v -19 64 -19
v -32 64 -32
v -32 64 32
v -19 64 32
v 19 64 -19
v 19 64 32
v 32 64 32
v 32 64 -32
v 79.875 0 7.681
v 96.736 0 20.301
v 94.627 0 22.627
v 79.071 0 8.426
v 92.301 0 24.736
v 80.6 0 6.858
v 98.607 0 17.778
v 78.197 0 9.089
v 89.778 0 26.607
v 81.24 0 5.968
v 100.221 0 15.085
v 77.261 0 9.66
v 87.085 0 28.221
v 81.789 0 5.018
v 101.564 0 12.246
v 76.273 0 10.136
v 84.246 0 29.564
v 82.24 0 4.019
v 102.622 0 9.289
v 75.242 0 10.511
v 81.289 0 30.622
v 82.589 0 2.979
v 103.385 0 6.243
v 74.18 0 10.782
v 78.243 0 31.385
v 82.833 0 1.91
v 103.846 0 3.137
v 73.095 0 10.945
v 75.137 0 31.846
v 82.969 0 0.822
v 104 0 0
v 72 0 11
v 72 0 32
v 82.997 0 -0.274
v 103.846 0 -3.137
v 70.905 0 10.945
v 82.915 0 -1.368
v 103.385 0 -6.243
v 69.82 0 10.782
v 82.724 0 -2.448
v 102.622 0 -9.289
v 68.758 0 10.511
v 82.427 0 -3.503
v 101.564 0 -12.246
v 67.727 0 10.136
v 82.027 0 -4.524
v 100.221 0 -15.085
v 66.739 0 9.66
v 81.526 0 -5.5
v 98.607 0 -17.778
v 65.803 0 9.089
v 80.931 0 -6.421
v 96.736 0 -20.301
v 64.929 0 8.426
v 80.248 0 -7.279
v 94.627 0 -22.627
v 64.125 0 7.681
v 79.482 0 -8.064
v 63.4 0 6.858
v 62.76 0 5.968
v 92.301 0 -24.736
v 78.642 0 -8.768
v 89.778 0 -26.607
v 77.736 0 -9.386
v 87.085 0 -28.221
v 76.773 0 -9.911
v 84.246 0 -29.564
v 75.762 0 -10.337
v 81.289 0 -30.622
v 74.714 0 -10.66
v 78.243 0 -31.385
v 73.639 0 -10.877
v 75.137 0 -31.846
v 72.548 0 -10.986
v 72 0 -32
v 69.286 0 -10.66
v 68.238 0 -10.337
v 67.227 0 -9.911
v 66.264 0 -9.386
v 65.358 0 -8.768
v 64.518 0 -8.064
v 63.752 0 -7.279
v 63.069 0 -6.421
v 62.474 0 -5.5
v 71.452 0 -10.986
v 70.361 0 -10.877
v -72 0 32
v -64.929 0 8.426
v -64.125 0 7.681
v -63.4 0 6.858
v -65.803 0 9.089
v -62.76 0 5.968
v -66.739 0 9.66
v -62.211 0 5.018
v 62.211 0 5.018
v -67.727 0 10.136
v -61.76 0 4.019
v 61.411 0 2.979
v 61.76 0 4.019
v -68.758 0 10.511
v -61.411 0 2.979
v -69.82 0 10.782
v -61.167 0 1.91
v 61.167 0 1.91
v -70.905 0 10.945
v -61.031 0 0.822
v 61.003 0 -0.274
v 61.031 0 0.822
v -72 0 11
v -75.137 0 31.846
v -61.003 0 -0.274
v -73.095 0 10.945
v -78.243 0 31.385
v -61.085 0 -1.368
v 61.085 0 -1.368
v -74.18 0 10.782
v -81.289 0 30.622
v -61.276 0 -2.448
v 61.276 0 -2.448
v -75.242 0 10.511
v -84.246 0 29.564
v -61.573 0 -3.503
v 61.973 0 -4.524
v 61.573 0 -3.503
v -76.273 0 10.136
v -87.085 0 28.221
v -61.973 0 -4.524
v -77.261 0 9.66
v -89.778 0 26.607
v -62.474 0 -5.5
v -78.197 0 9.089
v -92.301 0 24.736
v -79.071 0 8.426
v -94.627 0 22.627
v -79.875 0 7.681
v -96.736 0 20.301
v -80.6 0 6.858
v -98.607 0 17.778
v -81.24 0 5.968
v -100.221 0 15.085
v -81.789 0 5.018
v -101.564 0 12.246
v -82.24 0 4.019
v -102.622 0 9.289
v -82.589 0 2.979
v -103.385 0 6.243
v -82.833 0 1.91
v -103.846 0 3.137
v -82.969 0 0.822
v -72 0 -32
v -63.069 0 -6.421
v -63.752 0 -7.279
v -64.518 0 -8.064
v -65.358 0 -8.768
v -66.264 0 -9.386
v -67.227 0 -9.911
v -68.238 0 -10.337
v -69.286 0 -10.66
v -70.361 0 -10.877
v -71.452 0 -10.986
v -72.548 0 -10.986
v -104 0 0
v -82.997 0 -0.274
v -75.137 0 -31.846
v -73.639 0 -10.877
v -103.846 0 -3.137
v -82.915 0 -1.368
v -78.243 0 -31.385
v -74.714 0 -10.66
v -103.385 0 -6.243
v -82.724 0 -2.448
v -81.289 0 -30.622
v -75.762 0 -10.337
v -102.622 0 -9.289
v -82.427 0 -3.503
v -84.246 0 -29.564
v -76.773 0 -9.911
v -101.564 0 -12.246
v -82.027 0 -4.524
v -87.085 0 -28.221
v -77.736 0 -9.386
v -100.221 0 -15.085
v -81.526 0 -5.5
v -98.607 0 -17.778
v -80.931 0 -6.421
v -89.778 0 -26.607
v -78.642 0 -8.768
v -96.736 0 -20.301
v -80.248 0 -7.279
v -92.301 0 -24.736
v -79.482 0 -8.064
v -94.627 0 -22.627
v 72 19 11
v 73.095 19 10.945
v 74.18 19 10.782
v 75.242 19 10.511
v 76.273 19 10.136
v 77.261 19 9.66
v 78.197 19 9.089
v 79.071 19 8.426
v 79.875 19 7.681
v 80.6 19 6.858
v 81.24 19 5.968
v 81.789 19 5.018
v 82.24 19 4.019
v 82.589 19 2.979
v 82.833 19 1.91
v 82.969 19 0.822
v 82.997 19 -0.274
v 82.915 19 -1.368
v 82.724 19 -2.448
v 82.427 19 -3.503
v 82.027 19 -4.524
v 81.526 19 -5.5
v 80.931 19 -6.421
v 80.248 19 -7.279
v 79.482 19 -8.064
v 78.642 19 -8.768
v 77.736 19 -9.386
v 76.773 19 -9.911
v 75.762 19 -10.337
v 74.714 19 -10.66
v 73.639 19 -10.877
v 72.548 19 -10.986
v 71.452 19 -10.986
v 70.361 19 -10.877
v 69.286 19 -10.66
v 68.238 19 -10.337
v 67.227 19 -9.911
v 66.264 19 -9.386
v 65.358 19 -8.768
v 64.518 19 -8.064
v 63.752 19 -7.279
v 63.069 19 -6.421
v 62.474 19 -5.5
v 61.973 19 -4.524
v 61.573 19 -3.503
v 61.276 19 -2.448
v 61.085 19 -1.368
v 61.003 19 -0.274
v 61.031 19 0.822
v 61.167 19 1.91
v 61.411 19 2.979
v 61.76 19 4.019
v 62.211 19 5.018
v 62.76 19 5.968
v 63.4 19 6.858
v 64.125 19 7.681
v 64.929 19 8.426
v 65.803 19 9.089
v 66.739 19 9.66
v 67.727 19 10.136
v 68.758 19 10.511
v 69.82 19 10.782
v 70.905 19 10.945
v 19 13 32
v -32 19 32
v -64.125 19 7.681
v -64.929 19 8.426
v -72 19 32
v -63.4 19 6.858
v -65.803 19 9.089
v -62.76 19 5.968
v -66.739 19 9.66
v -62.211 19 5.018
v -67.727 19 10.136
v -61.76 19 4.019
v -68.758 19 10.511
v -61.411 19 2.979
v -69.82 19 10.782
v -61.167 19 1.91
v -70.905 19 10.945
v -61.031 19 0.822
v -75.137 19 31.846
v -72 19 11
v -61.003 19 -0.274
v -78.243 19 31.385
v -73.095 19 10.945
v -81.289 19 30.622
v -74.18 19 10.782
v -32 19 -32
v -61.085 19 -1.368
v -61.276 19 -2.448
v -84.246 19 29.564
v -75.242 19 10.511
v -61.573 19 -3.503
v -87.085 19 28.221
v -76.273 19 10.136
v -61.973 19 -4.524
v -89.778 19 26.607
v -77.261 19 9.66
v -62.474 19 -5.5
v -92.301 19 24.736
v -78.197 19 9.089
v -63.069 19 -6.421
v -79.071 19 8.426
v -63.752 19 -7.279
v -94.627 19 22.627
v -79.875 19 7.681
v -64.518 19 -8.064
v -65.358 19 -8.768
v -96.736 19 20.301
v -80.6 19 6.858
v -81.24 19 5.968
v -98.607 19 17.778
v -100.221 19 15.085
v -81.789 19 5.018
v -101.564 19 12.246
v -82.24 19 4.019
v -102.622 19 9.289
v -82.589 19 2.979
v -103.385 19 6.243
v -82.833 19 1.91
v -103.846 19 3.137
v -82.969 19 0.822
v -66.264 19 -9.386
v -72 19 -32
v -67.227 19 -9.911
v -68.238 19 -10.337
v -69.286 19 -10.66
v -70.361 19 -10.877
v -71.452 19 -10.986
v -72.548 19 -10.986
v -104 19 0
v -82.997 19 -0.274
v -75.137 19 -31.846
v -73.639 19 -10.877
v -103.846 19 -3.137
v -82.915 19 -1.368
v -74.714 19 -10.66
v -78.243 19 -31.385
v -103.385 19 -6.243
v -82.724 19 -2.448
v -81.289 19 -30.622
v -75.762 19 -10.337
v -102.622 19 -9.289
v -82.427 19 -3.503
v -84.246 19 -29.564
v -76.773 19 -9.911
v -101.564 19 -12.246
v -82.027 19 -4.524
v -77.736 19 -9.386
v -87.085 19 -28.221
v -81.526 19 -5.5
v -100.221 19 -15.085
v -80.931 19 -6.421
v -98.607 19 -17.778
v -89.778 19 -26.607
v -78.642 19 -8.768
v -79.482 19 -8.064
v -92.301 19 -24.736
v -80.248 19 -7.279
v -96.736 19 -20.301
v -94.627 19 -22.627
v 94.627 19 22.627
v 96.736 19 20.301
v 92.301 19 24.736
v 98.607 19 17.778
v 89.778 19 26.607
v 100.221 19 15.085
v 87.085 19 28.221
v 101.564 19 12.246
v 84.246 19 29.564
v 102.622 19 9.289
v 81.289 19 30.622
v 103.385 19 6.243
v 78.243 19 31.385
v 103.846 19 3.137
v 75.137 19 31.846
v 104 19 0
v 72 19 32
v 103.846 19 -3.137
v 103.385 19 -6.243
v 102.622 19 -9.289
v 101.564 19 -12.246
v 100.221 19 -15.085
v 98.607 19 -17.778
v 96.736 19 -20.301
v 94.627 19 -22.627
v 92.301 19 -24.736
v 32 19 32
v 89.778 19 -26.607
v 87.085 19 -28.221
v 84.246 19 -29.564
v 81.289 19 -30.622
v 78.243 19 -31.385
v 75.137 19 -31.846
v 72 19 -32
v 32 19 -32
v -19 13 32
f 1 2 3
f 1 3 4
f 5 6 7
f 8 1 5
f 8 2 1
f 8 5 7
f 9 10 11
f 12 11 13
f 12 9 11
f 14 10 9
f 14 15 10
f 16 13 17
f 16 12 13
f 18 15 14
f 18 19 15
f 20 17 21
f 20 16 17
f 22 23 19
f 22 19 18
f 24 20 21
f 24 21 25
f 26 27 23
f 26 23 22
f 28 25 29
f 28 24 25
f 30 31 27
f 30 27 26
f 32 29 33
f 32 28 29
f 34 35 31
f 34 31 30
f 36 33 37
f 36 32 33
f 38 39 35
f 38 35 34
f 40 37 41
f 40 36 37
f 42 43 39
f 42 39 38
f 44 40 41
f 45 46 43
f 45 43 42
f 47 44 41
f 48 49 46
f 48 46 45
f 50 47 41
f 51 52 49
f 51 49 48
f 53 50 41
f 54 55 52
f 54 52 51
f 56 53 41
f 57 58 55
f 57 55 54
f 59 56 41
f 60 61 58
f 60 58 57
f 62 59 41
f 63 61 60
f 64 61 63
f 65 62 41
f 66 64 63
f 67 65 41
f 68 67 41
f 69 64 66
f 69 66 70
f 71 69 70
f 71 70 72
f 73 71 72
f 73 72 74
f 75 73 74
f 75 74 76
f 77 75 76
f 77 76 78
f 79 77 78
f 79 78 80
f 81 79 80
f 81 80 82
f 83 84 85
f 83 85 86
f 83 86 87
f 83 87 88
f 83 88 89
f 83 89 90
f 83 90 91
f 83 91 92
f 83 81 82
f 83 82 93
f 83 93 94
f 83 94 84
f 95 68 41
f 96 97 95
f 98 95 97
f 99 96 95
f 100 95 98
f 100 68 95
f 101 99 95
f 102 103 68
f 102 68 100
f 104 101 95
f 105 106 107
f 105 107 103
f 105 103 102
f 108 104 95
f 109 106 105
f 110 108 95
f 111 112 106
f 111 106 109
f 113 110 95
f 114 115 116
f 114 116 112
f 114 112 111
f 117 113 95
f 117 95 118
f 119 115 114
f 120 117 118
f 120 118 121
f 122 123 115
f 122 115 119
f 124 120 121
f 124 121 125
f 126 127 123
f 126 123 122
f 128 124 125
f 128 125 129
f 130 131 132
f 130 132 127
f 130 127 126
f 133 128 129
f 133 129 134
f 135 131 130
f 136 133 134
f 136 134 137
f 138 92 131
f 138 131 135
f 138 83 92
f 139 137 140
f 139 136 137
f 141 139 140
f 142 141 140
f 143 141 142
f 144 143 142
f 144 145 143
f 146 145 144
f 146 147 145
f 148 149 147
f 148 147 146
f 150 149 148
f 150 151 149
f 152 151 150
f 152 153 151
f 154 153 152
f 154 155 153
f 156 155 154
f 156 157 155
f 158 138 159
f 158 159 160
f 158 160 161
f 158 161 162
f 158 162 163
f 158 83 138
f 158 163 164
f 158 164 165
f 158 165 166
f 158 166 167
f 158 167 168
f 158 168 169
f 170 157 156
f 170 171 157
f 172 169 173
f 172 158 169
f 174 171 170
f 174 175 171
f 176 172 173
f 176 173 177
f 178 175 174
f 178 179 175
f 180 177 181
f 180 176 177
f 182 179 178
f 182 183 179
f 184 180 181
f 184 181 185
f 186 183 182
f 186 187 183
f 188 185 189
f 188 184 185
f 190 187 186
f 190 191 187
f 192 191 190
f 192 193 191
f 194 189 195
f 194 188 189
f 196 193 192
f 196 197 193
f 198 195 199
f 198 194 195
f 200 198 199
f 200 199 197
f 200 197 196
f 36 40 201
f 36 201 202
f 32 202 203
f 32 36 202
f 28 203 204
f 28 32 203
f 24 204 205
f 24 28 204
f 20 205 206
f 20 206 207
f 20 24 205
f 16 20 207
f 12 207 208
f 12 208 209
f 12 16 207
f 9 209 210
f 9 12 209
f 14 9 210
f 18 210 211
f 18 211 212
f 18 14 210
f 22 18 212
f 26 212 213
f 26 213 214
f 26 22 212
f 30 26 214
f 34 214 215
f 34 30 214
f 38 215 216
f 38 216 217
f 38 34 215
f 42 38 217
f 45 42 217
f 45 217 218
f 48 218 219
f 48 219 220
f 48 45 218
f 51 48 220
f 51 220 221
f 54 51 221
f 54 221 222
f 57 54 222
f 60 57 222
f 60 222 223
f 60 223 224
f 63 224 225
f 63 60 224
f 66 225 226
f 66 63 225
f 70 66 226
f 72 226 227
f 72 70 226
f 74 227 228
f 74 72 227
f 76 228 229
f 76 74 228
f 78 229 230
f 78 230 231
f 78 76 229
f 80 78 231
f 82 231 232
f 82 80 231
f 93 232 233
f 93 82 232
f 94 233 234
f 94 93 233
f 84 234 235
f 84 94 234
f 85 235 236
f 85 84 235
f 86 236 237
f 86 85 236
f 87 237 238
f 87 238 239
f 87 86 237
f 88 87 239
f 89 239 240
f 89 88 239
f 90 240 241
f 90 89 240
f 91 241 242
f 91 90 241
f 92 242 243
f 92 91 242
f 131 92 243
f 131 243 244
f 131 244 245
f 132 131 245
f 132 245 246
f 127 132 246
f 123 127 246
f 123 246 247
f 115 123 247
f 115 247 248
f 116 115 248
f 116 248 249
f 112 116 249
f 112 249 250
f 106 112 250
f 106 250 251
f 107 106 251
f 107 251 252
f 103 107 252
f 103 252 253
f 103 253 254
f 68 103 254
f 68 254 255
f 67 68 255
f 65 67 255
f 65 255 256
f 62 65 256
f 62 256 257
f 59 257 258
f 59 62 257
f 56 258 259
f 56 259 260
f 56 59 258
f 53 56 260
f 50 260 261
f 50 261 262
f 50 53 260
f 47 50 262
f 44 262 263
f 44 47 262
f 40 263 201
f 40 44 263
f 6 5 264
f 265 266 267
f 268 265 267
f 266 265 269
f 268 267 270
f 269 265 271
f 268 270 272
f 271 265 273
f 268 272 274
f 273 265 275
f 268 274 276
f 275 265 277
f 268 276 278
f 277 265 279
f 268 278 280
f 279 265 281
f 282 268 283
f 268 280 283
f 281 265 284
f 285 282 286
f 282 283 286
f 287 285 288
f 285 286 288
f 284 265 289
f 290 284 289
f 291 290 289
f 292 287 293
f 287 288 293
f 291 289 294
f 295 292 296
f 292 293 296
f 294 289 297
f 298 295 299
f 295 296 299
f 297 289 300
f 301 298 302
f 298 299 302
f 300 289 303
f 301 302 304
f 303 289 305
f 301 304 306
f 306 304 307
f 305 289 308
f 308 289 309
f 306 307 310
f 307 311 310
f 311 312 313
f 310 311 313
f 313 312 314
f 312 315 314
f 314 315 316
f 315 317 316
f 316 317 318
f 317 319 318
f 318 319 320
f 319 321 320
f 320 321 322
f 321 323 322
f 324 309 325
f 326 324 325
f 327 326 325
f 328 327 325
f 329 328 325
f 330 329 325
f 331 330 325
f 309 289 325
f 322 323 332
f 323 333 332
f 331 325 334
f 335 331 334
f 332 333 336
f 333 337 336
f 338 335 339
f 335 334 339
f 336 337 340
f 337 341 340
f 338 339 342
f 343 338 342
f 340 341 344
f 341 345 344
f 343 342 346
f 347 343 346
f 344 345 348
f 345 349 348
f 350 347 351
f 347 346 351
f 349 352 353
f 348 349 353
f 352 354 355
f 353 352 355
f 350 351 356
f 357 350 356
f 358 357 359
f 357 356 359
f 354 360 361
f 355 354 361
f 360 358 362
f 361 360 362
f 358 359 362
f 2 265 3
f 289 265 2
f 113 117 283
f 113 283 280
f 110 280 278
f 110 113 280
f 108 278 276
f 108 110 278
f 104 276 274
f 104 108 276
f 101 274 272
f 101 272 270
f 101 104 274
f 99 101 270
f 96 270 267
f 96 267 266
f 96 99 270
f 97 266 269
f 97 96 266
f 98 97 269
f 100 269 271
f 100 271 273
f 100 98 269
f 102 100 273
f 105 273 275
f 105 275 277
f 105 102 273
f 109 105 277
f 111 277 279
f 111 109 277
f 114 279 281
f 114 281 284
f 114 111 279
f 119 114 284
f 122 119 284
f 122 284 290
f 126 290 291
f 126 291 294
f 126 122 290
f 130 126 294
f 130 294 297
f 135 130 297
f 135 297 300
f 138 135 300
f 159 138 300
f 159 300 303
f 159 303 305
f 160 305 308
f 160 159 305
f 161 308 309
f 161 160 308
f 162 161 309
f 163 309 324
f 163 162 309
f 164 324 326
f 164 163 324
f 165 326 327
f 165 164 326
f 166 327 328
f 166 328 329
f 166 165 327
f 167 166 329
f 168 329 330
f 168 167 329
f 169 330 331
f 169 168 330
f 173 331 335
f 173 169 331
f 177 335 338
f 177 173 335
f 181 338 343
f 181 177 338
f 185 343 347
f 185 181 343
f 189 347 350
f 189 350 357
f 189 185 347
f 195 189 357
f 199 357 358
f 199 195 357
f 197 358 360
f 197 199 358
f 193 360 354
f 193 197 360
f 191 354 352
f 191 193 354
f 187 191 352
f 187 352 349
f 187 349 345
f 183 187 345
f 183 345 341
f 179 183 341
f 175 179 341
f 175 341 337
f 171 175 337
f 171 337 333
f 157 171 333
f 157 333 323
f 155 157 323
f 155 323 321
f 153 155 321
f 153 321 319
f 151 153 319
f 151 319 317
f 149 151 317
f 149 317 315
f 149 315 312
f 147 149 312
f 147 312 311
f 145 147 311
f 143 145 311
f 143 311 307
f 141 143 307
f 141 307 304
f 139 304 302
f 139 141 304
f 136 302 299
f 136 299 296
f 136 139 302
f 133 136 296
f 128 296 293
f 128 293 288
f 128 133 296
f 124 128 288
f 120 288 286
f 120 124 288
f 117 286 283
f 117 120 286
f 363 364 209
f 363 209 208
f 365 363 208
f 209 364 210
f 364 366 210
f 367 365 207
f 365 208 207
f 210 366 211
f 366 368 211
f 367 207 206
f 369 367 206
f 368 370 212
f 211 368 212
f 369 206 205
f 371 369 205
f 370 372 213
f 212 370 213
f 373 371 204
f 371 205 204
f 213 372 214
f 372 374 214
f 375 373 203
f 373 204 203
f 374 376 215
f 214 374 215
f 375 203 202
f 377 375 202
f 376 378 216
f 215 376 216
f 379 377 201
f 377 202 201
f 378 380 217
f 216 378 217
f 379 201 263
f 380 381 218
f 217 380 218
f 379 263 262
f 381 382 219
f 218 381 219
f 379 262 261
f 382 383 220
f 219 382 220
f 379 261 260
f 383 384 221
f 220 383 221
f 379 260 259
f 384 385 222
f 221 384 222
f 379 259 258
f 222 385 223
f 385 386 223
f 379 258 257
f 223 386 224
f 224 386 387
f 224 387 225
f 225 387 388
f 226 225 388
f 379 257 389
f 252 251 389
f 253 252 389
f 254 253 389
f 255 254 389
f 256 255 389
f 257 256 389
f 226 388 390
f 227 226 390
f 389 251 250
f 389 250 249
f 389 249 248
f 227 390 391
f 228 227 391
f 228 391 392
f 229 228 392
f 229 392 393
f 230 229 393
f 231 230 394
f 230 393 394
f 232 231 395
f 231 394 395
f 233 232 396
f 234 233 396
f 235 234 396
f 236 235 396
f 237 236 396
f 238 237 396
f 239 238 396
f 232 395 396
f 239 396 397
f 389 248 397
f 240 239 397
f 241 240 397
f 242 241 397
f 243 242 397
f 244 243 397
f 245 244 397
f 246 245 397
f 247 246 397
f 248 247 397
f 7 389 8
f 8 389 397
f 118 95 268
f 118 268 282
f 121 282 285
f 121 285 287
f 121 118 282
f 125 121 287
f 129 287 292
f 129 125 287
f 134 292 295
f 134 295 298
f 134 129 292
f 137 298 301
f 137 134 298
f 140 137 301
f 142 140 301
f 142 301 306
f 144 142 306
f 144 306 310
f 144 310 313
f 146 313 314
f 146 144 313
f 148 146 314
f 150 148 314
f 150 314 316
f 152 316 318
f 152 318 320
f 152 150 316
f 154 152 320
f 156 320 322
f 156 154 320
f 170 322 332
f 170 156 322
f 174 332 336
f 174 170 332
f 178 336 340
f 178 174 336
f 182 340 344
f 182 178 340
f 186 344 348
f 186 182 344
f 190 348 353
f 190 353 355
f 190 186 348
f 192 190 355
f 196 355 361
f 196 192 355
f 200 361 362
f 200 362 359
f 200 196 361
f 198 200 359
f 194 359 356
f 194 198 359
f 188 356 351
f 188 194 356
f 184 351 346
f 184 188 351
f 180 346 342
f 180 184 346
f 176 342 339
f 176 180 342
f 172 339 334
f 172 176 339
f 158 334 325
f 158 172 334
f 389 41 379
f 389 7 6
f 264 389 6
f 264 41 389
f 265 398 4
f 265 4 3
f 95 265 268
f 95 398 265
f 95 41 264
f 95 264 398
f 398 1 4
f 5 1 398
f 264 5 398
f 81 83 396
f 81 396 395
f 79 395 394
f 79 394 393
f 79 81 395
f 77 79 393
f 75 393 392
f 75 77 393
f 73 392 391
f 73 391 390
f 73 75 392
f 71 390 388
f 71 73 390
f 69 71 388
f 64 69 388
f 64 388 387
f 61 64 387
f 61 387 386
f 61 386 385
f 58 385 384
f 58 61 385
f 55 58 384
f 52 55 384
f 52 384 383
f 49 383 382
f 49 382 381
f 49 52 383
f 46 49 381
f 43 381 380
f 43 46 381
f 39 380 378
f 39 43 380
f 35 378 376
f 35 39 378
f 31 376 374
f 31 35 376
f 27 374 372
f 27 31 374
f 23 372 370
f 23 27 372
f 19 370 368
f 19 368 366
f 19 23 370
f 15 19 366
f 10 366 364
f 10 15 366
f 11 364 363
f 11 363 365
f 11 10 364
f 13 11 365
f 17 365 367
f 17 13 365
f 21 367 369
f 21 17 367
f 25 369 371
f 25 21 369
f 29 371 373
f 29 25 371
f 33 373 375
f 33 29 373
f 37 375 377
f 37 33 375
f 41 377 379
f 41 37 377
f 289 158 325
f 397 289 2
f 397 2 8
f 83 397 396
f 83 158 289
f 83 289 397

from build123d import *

# Parameters (mm, degrees)
SKETCH1_R           = 11
BOSS_EXTRUDE1_DEPTH = 19
SKETCH2_W           = 64
SKETCH2_H           = 64
BOSS_EXTRUDE2_DEPTH = 45
CUT_EXTRUDE2_START  = -13
CUT_EXTRUDE2_DEPTH  = 38


with BuildPart() as part:
    # Sketch1 → Boss-Extrude1 (new body)
    with BuildSketch(Plane(origin=(0, 0, 0), x_dir=(1, 0, 0), z_dir=(0, 1, 0))):
        with BuildLine():
            Line((-72, 32), (72, 32))
            ThreePointArc((72, 32), (104, 0), (72, -32))
            Line((72, -32), (-72, -32))
            ThreePointArc((-72, -32), (-104, 0), (-72, 32))
        make_face()
        with Locations(Location((-72, 0, 0), (0, 0, 270))):
            Circle(SKETCH1_R, mode=Mode.SUBTRACT)
        with Locations(Location((72, 0, 0), (0, 0, 270))):
            Circle(SKETCH1_R, mode=Mode.SUBTRACT)
    extrude(amount=BOSS_EXTRUDE1_DEPTH)

    # Sketch2 → Boss-Extrude2 (add)
    with BuildSketch(Plane(origin=(0, 19, 0), x_dir=(1, 0, 0), z_dir=(0, 1, 0))):
        Rectangle(SKETCH2_W, SKETCH2_H)
    extrude(amount=BOSS_EXTRUDE2_DEPTH)

    # Sketch4 → Cut-Extrude2 (cut)
    with BuildSketch(Plane.ZY.offset(32).offset(CUT_EXTRUDE2_START)):
        Polygon((32, 64), (-19, 64), (32, 13), align=None)
    extrude(amount=-CUT_EXTRUDE2_DEPTH, mode=Mode.SUBTRACT)


solid = part.part
